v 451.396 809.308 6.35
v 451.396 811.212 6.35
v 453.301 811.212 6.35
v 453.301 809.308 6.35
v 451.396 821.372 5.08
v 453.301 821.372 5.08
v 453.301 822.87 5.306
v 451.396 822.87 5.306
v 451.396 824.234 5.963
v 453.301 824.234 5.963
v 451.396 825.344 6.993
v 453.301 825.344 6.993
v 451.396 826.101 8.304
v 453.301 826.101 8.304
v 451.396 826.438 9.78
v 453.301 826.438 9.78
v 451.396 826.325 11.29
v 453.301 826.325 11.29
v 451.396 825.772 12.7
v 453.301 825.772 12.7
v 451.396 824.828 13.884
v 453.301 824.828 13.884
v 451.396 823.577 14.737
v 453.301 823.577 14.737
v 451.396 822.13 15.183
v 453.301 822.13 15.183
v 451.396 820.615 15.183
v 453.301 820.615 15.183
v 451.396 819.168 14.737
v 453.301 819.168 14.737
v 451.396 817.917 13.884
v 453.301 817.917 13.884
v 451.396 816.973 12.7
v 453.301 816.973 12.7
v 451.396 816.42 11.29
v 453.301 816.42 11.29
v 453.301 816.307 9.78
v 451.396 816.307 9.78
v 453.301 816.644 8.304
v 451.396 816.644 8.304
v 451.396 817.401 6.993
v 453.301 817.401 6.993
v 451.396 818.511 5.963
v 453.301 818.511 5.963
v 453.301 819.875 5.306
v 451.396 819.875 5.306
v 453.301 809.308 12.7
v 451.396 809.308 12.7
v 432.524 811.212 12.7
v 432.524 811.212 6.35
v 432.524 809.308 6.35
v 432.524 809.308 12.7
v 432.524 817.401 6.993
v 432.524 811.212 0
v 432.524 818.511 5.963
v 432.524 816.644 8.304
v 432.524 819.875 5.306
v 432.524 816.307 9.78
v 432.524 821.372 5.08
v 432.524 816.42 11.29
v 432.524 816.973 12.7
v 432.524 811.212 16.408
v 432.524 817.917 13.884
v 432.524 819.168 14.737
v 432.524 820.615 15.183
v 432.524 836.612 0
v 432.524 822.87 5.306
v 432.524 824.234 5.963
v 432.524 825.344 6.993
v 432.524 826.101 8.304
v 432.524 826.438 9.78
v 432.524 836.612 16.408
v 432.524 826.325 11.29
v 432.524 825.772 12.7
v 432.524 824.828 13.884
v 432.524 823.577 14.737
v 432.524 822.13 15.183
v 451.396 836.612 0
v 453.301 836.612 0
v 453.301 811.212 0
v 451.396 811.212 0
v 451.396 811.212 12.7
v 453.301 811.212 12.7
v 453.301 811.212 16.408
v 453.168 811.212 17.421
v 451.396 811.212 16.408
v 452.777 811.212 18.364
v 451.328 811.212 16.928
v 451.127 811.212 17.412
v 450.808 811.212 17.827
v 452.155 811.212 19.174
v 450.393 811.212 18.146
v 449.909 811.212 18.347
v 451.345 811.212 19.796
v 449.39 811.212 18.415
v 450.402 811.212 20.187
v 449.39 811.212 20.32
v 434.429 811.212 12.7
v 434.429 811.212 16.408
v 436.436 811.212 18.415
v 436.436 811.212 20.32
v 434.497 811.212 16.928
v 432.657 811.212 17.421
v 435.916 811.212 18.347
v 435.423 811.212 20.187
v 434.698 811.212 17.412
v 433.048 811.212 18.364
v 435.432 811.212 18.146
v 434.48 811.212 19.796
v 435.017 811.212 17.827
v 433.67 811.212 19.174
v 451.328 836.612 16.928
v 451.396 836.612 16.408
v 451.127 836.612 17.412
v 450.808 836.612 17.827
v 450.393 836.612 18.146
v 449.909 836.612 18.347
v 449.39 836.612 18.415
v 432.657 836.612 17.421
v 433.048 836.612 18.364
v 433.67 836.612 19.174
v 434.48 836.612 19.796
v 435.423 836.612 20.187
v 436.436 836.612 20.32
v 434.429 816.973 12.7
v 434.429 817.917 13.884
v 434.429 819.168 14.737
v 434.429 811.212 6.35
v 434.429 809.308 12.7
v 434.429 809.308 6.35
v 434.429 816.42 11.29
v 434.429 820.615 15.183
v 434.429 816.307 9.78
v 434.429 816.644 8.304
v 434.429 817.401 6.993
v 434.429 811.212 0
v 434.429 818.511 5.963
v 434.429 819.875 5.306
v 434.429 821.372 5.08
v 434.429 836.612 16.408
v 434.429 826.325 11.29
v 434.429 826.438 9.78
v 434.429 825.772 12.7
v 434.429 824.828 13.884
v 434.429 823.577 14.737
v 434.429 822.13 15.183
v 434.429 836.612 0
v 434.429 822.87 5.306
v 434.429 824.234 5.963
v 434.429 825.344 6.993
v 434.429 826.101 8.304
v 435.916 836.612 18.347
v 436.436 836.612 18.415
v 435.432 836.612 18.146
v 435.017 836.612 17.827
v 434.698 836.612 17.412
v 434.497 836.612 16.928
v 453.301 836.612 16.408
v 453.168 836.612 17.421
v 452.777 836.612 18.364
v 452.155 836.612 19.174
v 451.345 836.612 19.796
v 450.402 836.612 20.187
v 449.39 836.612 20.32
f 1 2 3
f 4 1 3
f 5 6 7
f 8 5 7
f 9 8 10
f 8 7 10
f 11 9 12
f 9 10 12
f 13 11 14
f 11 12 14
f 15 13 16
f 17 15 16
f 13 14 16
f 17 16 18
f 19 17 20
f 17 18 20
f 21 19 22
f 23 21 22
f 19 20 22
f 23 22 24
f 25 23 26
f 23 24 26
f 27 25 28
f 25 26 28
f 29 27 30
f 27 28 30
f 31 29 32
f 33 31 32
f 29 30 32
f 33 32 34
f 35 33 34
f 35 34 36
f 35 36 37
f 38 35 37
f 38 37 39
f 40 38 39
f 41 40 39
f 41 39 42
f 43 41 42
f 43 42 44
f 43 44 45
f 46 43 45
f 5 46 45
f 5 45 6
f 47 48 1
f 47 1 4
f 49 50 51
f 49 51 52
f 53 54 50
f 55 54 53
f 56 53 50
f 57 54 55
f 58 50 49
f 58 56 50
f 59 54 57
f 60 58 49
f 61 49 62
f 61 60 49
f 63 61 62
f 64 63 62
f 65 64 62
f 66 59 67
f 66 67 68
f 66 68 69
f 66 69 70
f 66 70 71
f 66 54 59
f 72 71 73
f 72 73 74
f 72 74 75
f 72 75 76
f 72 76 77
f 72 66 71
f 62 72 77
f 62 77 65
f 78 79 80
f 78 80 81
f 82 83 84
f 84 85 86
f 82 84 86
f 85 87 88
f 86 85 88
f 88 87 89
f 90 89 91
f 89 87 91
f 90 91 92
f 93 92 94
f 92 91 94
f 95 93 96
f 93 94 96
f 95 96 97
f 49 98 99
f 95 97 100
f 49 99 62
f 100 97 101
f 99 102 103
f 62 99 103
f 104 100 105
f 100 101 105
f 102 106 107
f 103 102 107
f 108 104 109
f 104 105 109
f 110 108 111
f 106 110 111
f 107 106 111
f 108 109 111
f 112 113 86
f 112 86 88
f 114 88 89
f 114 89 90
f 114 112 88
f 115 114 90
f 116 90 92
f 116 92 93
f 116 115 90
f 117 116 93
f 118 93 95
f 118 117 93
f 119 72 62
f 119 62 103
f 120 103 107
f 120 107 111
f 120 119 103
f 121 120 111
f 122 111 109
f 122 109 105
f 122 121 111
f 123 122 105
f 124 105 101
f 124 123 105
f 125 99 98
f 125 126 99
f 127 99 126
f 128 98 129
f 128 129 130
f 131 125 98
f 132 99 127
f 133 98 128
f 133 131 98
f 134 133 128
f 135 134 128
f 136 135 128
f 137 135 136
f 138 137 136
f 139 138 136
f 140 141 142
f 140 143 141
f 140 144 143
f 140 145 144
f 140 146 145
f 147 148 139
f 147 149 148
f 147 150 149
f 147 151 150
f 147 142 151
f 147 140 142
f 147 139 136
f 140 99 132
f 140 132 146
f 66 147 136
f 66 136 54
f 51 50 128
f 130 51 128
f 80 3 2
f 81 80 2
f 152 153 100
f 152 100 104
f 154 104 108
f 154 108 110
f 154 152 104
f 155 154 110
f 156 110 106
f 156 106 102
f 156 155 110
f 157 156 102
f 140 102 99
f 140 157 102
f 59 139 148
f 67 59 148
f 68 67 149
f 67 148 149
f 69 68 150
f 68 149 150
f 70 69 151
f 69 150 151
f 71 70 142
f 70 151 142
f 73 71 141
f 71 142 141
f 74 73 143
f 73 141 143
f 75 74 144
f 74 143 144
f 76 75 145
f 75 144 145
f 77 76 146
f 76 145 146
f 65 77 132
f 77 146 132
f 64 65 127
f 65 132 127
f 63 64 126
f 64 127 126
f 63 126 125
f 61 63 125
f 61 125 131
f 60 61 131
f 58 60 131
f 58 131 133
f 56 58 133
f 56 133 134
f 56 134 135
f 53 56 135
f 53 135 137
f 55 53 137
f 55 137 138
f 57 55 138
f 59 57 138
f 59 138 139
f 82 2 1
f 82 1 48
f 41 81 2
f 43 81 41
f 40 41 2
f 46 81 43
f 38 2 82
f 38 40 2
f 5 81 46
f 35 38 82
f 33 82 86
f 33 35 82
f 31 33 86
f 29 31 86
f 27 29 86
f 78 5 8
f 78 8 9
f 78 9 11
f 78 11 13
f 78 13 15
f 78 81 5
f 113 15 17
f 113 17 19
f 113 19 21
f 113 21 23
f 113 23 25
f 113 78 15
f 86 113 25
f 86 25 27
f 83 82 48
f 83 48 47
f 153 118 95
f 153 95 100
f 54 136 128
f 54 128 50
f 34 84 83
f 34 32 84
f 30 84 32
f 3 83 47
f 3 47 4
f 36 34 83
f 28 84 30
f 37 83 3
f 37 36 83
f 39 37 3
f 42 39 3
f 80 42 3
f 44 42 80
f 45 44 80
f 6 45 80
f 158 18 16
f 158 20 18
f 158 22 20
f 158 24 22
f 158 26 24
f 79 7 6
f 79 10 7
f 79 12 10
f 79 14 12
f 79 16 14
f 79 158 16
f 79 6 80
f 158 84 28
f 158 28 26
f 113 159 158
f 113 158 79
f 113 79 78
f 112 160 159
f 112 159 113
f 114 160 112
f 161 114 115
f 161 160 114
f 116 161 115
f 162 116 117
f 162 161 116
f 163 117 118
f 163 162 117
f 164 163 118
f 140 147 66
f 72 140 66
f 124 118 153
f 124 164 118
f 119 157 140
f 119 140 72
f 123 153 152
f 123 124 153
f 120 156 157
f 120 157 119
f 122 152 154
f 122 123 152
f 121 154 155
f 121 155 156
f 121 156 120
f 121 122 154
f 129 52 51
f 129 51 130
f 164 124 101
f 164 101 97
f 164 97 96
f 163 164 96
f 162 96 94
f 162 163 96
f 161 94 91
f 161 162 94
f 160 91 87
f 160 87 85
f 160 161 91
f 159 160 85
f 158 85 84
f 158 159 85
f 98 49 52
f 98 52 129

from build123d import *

# Parameters (mm, degrees)
BASE_FLANGE1_DEPTH      = 25.4
SKETCH6_R               = 5.08
CUT_EXTRUDE1_DEPTH      = 838.117118208
BOSS_EXTRUDE1_OUTLINE_W = 1.905
BOSS_EXTRUDE1_OUTLINE_H = 6.35
BOSS_EXTRUDE1_DEPTH     = 1.905


# Read off the part's stored shape, not the designer's step: Boss-Extrude1
# Sheet-metal steps are written as plain solids
with BuildPart() as part:
    # Sketch1 → Base-Flange1 (new body)
    with BuildSketch(Plane(origin=(0, 836.6125, -836.6125), x_dir=(1, 0, 0), z_dir=(0, -1, 0))):
        with BuildLine():
            Line((432.5239, 836.6125), (432.5239, 853.0209))
            ThreePointArc((432.5239, 853.0209), (433.669581115, 855.786818885), (436.4355, 856.9325))
            Line((436.4355, 856.9325), (449.3895, 856.9325))
            ThreePointArc((449.3895, 856.9325), (452.155418885, 855.786818885), (453.3011, 853.0209))
            Line((453.3011, 853.0209), (453.3011, 836.6125))
            Line((453.3011, 836.6125), (451.3961, 836.6125))
            Line((451.3961, 836.6125), (451.3961, 853.0209))
            ThreePointArc((451.3961, 853.0209), (450.808380467, 854.439780467), (449.3895, 855.0275))
            Line((449.3895, 855.0275), (436.4355, 855.0275))
            ThreePointArc((436.4355, 855.0275), (435.016619533, 854.439780467), (434.4289, 853.0209))
            Line((434.4289, 853.0209), (434.4289, 836.6125))
            Line((434.4289, 836.6125), (432.5239, 836.6125))
        make_face()
    extrude(amount=BASE_FLANGE1_DEPTH)

    # Sketch6 → Cut-Extrude1 (cut, through all)
    with BuildSketch(Plane(origin=(453.3011, 0, 0), x_dir=(0, 0, -1), z_dir=(1, 0, 0))):
        with Locations((-10.16, 821.3725)):
            Circle(SKETCH6_R)
    extrude(amount=-CUT_EXTRUDE1_DEPTH, mode=Mode.SUBTRACT)

    # Boss-Extrude1 outline → Boss-Extrude1 (add)
    with BuildSketch(Plane.XZ.offset(-811.2125)):
        with Locations((452.3486, 9.525)):
            Rectangle(BOSS_EXTRUDE1_OUTLINE_W, BOSS_EXTRUDE1_OUTLINE_H)
        with Locations((433.4764, 9.525)):
            Rectangle(BOSS_EXTRUDE1_OUTLINE_W, BOSS_EXTRUDE1_OUTLINE_H)
    extrude(amount=BOSS_EXTRUDE1_DEPTH)


solid = part.part
